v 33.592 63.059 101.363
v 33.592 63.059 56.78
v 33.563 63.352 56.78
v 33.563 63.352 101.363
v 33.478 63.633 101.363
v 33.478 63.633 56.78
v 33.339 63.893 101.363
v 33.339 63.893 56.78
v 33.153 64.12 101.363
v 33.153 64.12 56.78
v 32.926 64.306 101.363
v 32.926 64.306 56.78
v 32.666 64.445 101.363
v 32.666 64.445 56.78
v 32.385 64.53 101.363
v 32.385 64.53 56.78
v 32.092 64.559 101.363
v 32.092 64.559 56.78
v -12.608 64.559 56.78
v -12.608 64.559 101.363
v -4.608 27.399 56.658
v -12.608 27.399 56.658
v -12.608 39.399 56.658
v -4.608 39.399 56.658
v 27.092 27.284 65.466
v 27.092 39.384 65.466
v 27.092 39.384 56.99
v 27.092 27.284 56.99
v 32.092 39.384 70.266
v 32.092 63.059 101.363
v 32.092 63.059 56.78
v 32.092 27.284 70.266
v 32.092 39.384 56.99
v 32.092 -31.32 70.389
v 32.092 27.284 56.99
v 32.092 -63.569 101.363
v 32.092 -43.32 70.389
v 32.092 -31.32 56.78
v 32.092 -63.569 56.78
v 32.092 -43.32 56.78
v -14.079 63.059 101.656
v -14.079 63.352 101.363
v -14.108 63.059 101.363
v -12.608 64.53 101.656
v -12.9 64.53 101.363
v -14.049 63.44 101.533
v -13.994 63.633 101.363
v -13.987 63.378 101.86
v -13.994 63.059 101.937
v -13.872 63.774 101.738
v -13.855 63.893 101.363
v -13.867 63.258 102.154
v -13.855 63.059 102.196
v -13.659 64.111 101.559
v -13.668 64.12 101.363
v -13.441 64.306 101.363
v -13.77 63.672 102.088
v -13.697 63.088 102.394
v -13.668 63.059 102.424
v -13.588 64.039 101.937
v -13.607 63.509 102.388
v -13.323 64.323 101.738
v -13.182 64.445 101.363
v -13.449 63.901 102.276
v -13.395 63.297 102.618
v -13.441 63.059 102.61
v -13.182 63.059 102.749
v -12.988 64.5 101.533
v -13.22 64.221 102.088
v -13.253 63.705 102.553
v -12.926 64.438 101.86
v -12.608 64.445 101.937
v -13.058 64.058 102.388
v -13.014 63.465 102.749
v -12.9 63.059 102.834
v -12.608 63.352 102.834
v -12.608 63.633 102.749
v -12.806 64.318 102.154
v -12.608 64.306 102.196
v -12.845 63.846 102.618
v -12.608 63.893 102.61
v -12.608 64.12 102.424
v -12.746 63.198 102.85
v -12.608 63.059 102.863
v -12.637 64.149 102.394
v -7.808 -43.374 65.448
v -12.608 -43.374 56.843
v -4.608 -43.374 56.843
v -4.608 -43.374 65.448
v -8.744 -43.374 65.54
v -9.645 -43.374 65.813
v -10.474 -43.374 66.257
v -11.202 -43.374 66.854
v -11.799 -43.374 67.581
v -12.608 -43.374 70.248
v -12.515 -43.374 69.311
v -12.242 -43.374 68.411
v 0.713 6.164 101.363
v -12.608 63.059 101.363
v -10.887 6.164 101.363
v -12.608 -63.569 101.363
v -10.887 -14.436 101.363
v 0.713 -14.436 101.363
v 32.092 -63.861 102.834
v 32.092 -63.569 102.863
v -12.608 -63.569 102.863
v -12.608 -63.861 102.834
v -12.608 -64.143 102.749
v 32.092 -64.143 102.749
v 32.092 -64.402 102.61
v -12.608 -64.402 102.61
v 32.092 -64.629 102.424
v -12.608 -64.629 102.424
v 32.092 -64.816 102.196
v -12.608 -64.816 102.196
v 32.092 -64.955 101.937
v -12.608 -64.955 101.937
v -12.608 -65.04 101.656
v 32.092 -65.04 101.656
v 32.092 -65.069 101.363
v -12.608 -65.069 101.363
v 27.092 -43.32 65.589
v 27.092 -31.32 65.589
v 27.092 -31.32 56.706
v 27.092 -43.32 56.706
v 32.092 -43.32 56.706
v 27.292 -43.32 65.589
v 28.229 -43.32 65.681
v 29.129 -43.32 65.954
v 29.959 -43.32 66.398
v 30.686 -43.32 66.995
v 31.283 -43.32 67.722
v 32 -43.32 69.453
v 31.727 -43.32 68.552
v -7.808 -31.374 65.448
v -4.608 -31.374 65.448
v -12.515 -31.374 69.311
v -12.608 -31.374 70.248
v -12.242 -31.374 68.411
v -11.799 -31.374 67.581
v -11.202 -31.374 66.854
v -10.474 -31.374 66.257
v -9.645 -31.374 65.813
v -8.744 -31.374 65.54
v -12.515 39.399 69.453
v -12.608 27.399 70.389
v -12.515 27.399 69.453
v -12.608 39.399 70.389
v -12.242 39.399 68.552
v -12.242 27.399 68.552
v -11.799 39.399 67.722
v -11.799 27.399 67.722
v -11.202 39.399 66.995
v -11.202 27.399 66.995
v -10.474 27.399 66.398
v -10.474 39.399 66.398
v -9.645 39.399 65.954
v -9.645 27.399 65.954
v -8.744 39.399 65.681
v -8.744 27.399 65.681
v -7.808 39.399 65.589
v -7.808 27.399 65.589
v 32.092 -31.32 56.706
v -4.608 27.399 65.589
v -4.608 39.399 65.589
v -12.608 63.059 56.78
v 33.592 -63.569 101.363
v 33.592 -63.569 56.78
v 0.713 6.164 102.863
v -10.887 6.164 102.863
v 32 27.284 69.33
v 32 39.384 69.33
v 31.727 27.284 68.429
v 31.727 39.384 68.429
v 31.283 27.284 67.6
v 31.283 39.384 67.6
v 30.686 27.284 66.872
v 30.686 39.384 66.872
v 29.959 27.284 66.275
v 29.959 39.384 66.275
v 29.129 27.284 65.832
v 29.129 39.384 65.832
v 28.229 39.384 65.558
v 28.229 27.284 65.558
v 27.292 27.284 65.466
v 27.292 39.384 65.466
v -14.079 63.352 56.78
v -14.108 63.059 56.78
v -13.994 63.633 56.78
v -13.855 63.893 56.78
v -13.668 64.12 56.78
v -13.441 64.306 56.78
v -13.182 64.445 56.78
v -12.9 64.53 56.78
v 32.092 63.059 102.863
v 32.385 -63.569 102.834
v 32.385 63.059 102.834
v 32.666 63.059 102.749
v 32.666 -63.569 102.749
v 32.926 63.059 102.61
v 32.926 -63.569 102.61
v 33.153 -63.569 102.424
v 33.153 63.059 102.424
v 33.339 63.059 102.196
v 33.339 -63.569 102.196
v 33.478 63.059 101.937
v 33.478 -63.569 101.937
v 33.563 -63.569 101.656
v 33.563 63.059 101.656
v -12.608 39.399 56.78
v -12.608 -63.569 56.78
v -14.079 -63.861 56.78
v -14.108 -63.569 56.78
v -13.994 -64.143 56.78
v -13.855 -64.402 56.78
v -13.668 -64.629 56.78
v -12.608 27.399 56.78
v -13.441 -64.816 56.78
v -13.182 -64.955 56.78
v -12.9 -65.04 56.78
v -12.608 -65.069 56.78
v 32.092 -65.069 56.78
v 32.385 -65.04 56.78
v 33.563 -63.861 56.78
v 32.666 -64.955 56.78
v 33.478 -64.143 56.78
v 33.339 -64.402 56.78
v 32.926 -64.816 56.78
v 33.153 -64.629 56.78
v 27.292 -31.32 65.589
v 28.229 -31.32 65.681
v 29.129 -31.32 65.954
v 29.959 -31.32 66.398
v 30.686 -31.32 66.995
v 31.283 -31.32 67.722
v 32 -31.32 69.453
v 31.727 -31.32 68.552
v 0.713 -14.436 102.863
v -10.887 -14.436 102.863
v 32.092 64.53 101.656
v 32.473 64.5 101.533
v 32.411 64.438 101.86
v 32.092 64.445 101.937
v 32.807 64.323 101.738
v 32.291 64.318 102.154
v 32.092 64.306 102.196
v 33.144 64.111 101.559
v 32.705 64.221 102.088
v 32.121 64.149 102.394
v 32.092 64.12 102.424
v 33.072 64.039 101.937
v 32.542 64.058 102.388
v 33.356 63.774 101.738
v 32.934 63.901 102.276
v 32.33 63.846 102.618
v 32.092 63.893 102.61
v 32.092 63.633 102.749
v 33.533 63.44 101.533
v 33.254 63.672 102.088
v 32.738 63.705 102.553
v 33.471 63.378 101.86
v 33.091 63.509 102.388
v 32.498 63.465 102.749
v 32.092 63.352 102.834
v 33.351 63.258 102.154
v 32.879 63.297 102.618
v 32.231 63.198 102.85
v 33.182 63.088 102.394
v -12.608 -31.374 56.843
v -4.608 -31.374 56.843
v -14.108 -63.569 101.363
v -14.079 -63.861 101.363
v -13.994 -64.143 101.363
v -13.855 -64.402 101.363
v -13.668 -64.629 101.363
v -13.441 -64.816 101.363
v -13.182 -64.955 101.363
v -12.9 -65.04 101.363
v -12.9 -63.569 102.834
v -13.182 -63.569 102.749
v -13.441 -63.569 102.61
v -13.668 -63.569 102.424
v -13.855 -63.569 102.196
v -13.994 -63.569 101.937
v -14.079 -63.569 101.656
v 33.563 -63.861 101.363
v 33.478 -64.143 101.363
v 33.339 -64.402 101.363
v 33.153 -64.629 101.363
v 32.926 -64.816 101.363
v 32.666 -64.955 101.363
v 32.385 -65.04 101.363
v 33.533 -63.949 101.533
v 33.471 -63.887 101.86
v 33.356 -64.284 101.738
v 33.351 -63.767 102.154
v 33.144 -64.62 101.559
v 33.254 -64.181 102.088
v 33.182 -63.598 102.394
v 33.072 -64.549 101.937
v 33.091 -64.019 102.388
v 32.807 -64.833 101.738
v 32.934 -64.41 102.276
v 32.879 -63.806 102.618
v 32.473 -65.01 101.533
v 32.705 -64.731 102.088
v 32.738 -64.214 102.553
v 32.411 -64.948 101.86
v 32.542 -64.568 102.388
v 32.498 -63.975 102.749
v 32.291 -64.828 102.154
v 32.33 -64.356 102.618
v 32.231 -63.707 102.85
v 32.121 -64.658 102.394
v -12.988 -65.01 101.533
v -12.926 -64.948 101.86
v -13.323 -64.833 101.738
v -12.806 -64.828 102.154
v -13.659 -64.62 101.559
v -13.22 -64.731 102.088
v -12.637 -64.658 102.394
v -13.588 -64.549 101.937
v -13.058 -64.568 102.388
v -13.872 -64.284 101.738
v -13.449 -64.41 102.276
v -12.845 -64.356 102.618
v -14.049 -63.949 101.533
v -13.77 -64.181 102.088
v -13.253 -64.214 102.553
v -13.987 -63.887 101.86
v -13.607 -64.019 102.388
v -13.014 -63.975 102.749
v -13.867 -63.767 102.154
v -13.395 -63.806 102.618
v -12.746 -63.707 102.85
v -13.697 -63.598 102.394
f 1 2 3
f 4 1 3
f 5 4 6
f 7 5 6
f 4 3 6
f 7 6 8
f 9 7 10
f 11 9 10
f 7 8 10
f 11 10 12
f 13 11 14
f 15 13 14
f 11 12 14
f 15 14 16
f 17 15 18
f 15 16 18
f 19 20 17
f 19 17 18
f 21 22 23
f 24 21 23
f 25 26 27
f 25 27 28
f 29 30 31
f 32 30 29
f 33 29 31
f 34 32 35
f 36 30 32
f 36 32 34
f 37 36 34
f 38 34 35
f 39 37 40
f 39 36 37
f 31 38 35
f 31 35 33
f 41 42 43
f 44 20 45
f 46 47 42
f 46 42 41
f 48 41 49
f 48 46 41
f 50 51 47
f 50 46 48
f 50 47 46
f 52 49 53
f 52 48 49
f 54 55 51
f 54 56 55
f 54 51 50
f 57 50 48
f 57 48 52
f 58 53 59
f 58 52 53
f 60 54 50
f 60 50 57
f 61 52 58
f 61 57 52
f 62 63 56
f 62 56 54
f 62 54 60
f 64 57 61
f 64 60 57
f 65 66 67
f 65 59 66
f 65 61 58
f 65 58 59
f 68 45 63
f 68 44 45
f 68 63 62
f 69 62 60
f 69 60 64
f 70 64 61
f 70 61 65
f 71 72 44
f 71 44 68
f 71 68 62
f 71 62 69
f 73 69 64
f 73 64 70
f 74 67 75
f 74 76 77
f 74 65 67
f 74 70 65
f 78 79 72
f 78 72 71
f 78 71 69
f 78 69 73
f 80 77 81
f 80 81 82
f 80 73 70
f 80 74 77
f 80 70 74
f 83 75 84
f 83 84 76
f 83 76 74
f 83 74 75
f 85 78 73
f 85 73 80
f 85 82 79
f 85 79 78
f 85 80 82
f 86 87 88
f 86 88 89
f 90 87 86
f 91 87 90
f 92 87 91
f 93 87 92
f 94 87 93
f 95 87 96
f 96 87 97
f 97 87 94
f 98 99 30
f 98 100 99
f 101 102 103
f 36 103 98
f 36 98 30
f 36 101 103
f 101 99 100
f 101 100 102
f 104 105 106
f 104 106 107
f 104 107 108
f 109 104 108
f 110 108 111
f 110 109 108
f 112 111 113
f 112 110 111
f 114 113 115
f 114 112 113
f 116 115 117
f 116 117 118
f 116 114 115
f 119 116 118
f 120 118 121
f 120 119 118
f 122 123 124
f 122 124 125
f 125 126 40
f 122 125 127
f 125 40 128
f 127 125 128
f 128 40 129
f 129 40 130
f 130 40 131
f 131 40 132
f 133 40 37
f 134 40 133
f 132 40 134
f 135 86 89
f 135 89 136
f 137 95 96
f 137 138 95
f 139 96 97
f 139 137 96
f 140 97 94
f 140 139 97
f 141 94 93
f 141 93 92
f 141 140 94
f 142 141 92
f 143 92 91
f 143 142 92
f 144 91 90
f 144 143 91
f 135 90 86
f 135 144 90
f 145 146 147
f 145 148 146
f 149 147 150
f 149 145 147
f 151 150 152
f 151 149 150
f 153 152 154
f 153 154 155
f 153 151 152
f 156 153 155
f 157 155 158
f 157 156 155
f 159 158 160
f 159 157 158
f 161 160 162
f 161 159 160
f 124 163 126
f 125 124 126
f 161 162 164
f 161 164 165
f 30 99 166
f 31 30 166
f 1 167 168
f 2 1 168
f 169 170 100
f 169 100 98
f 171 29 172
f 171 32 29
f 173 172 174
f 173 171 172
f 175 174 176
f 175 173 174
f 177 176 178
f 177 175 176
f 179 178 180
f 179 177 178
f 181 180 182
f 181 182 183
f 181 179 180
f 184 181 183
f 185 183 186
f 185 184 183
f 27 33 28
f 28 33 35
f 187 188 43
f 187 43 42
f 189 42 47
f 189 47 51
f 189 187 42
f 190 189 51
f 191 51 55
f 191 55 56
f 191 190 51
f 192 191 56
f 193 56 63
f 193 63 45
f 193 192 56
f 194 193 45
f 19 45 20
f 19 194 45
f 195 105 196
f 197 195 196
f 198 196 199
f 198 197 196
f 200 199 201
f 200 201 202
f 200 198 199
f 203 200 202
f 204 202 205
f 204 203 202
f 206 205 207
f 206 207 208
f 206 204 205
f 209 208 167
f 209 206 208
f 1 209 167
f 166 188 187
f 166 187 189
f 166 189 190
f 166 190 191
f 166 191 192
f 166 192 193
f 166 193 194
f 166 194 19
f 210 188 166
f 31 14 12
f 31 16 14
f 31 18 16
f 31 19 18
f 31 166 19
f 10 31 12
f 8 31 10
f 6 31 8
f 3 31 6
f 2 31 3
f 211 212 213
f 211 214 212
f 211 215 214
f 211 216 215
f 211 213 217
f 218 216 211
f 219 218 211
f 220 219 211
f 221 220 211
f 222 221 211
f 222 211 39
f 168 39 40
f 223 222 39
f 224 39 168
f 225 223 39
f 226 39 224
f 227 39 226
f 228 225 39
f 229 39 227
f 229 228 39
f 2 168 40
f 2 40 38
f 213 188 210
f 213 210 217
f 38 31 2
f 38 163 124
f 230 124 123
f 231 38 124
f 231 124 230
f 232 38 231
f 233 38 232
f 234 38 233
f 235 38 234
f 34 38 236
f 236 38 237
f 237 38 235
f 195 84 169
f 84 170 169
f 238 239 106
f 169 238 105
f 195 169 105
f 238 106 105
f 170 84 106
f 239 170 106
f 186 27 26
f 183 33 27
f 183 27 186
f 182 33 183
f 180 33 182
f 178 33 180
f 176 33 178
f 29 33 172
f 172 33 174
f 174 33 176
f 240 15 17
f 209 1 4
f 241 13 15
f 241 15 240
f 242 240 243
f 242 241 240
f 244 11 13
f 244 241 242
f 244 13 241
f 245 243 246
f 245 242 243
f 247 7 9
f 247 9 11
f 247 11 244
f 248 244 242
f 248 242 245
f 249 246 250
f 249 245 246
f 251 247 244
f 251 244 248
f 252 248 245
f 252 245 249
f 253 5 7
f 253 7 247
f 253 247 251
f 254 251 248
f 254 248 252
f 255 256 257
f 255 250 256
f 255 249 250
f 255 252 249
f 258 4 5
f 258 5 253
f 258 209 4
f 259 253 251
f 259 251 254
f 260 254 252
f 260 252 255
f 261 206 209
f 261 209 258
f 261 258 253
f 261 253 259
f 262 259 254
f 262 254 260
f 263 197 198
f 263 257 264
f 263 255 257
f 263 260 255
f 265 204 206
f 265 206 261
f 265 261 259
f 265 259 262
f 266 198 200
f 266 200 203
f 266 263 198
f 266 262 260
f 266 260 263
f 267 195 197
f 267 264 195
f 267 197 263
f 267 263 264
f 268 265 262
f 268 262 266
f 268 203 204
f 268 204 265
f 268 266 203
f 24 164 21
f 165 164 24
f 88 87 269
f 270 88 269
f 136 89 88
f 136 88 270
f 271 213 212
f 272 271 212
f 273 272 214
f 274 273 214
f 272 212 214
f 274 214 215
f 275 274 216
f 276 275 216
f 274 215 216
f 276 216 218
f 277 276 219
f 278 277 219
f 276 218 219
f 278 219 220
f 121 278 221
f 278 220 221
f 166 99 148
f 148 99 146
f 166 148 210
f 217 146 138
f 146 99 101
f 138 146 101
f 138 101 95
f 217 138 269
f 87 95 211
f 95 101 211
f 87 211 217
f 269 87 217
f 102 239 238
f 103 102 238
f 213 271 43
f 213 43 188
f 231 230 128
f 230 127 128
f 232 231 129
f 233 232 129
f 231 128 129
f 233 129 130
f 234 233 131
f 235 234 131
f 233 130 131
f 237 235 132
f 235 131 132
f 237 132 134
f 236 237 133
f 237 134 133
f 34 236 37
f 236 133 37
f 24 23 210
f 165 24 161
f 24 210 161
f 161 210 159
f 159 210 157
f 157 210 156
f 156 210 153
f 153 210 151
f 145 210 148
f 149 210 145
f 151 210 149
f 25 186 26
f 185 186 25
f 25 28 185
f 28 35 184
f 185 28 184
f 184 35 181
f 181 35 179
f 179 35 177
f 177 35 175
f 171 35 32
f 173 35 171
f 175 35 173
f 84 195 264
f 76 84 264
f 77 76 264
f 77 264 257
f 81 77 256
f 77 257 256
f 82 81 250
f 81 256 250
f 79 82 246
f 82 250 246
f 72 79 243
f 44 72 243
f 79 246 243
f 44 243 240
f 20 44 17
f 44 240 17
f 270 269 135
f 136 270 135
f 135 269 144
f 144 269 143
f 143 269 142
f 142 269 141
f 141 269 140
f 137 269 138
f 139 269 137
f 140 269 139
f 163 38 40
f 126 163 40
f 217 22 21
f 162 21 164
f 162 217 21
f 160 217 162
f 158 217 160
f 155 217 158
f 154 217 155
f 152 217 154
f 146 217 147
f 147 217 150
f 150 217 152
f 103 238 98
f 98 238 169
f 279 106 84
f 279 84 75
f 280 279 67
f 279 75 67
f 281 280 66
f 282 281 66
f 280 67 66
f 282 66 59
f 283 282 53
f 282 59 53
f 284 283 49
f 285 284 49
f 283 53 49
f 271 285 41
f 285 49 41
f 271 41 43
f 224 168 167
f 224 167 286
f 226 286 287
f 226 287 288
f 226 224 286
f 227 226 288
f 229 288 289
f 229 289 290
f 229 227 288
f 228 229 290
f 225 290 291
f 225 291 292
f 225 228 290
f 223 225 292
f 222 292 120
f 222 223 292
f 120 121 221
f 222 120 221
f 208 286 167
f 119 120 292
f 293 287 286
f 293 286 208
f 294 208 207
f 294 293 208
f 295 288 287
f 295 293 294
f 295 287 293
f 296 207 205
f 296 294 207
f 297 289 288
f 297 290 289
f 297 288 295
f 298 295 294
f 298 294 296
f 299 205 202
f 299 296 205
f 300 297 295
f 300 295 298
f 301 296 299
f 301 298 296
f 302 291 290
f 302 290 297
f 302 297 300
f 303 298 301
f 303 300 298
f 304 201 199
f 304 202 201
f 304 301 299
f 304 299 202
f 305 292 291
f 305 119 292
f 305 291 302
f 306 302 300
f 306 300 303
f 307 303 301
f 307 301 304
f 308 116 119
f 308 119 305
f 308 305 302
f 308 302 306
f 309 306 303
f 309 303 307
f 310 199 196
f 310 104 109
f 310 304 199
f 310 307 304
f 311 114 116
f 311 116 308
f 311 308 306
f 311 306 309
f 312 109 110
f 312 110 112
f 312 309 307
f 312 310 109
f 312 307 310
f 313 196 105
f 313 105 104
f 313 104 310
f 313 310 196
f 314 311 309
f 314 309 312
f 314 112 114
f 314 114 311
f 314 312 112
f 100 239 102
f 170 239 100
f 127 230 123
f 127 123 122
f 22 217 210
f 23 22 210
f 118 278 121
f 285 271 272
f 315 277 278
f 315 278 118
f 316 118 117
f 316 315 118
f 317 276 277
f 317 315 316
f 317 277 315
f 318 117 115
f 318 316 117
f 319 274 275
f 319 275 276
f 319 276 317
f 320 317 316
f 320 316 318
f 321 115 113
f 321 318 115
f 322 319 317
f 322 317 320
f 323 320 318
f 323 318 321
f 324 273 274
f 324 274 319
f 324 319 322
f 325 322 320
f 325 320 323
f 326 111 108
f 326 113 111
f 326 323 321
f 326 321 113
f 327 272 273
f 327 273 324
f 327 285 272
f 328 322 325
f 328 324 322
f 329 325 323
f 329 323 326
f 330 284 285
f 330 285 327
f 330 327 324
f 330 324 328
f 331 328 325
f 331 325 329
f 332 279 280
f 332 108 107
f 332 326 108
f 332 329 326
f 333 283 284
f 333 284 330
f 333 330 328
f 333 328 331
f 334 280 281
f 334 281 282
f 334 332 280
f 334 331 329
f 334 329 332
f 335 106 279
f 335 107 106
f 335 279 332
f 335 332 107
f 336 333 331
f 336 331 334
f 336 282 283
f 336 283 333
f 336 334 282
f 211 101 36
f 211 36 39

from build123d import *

# Parameters (mm, degrees)
SKETCH008_W     = 44.58321
SKETCH008_H     = 44.7
PAD006_DEPTH    = 126.628014
THICKNESS_T     = 1.5
SKETCH009_W     = 12
SKETCH009_H     = 8.605206
SKETCH009_H_2   = 8.931469
PAD007_DEPTH    = 8
SKETCH010_W     = 12.1
SKETCH010_H     = 8.476139
SKETCH010_W_2   = 12
SKETCH010_H_2   = 8.882789
PAD008_DEPTH    = 5
SKETCH014_W     = 11.6
SKETCH014_H     = 20.6
POCKET003_DEPTH = 5
FILLET_R        = 4.8


with BuildPart() as part:
    # Sketch008 (on Face1 of ShapeBinder002) → Pad006 (new body)
    with BuildSketch(Plane(origin=(0, -63.568756, 0), x_dir=(0, 0, -1), z_dir=(0, -1, 0))):
        with Locations((-79.071486, 9.742272)):
            Rectangle(SKETCH008_W, SKETCH008_H)
    extrude(amount=-PAD006_DEPTH)

    # Thickness
    thickness_openings = [part.faces().sort_by_distance(p)[0] for p in [
        (9.742272, -0.254749, 56.779881),
    ]]
    offset(amount=THICKNESS_T, openings=thickness_openings)

    # Sketch009 (on Face5 of Thickness) → Pad007 (join)
    with BuildSketch(Plane.YZ.offset(-12.607728)):
        with Locations((-37.374453, 61.145227)):
            Rectangle(SKETCH009_W, SKETCH009_H)
        with Locations((33.398816, 61.123247)):
            Rectangle(SKETCH009_W, SKETCH009_H_2)
    extrude(amount=PAD007_DEPTH)

    # Sketch010 (on Face1 of Pad007) → Pad008 (join)
    with BuildSketch(Plane(origin=(32.092272, 0, 0), x_dir=(0, -1, 0), z_dir=(-1, 0, 0))):
        with Locations((-33.333797, 61.228186)):
            Rectangle(SKETCH010_W, SKETCH010_H)
        with Locations((37.319737, 61.147633)):
            Rectangle(SKETCH010_W_2, SKETCH010_H_2)
    extrude(amount=PAD008_DEPTH)

    # Sketch014 (on Face45 of Pad008) → Pocket003 (cut)
    with BuildSketch(Plane.XY.offset(102.863091)):
        with Locations((-5.087287, -4.135811)):
            Rectangle(SKETCH014_W, SKETCH014_H)
    extrude(amount=-POCKET003_DEPTH, mode=Mode.SUBTRACT)

    # Fillet
    fillet_edges = [part.edges().sort_by_distance(p)[0] for p in [
        (32.092272, -37.319737, 65.589027),
        (32.092272, 33.333797, 65.466255),
        (-12.607728, -37.374453, 65.44783),
        (-12.607728, 33.398816, 65.588982),
    ]]
    fillet(fillet_edges, radius=FILLET_R)


solid = part.part
